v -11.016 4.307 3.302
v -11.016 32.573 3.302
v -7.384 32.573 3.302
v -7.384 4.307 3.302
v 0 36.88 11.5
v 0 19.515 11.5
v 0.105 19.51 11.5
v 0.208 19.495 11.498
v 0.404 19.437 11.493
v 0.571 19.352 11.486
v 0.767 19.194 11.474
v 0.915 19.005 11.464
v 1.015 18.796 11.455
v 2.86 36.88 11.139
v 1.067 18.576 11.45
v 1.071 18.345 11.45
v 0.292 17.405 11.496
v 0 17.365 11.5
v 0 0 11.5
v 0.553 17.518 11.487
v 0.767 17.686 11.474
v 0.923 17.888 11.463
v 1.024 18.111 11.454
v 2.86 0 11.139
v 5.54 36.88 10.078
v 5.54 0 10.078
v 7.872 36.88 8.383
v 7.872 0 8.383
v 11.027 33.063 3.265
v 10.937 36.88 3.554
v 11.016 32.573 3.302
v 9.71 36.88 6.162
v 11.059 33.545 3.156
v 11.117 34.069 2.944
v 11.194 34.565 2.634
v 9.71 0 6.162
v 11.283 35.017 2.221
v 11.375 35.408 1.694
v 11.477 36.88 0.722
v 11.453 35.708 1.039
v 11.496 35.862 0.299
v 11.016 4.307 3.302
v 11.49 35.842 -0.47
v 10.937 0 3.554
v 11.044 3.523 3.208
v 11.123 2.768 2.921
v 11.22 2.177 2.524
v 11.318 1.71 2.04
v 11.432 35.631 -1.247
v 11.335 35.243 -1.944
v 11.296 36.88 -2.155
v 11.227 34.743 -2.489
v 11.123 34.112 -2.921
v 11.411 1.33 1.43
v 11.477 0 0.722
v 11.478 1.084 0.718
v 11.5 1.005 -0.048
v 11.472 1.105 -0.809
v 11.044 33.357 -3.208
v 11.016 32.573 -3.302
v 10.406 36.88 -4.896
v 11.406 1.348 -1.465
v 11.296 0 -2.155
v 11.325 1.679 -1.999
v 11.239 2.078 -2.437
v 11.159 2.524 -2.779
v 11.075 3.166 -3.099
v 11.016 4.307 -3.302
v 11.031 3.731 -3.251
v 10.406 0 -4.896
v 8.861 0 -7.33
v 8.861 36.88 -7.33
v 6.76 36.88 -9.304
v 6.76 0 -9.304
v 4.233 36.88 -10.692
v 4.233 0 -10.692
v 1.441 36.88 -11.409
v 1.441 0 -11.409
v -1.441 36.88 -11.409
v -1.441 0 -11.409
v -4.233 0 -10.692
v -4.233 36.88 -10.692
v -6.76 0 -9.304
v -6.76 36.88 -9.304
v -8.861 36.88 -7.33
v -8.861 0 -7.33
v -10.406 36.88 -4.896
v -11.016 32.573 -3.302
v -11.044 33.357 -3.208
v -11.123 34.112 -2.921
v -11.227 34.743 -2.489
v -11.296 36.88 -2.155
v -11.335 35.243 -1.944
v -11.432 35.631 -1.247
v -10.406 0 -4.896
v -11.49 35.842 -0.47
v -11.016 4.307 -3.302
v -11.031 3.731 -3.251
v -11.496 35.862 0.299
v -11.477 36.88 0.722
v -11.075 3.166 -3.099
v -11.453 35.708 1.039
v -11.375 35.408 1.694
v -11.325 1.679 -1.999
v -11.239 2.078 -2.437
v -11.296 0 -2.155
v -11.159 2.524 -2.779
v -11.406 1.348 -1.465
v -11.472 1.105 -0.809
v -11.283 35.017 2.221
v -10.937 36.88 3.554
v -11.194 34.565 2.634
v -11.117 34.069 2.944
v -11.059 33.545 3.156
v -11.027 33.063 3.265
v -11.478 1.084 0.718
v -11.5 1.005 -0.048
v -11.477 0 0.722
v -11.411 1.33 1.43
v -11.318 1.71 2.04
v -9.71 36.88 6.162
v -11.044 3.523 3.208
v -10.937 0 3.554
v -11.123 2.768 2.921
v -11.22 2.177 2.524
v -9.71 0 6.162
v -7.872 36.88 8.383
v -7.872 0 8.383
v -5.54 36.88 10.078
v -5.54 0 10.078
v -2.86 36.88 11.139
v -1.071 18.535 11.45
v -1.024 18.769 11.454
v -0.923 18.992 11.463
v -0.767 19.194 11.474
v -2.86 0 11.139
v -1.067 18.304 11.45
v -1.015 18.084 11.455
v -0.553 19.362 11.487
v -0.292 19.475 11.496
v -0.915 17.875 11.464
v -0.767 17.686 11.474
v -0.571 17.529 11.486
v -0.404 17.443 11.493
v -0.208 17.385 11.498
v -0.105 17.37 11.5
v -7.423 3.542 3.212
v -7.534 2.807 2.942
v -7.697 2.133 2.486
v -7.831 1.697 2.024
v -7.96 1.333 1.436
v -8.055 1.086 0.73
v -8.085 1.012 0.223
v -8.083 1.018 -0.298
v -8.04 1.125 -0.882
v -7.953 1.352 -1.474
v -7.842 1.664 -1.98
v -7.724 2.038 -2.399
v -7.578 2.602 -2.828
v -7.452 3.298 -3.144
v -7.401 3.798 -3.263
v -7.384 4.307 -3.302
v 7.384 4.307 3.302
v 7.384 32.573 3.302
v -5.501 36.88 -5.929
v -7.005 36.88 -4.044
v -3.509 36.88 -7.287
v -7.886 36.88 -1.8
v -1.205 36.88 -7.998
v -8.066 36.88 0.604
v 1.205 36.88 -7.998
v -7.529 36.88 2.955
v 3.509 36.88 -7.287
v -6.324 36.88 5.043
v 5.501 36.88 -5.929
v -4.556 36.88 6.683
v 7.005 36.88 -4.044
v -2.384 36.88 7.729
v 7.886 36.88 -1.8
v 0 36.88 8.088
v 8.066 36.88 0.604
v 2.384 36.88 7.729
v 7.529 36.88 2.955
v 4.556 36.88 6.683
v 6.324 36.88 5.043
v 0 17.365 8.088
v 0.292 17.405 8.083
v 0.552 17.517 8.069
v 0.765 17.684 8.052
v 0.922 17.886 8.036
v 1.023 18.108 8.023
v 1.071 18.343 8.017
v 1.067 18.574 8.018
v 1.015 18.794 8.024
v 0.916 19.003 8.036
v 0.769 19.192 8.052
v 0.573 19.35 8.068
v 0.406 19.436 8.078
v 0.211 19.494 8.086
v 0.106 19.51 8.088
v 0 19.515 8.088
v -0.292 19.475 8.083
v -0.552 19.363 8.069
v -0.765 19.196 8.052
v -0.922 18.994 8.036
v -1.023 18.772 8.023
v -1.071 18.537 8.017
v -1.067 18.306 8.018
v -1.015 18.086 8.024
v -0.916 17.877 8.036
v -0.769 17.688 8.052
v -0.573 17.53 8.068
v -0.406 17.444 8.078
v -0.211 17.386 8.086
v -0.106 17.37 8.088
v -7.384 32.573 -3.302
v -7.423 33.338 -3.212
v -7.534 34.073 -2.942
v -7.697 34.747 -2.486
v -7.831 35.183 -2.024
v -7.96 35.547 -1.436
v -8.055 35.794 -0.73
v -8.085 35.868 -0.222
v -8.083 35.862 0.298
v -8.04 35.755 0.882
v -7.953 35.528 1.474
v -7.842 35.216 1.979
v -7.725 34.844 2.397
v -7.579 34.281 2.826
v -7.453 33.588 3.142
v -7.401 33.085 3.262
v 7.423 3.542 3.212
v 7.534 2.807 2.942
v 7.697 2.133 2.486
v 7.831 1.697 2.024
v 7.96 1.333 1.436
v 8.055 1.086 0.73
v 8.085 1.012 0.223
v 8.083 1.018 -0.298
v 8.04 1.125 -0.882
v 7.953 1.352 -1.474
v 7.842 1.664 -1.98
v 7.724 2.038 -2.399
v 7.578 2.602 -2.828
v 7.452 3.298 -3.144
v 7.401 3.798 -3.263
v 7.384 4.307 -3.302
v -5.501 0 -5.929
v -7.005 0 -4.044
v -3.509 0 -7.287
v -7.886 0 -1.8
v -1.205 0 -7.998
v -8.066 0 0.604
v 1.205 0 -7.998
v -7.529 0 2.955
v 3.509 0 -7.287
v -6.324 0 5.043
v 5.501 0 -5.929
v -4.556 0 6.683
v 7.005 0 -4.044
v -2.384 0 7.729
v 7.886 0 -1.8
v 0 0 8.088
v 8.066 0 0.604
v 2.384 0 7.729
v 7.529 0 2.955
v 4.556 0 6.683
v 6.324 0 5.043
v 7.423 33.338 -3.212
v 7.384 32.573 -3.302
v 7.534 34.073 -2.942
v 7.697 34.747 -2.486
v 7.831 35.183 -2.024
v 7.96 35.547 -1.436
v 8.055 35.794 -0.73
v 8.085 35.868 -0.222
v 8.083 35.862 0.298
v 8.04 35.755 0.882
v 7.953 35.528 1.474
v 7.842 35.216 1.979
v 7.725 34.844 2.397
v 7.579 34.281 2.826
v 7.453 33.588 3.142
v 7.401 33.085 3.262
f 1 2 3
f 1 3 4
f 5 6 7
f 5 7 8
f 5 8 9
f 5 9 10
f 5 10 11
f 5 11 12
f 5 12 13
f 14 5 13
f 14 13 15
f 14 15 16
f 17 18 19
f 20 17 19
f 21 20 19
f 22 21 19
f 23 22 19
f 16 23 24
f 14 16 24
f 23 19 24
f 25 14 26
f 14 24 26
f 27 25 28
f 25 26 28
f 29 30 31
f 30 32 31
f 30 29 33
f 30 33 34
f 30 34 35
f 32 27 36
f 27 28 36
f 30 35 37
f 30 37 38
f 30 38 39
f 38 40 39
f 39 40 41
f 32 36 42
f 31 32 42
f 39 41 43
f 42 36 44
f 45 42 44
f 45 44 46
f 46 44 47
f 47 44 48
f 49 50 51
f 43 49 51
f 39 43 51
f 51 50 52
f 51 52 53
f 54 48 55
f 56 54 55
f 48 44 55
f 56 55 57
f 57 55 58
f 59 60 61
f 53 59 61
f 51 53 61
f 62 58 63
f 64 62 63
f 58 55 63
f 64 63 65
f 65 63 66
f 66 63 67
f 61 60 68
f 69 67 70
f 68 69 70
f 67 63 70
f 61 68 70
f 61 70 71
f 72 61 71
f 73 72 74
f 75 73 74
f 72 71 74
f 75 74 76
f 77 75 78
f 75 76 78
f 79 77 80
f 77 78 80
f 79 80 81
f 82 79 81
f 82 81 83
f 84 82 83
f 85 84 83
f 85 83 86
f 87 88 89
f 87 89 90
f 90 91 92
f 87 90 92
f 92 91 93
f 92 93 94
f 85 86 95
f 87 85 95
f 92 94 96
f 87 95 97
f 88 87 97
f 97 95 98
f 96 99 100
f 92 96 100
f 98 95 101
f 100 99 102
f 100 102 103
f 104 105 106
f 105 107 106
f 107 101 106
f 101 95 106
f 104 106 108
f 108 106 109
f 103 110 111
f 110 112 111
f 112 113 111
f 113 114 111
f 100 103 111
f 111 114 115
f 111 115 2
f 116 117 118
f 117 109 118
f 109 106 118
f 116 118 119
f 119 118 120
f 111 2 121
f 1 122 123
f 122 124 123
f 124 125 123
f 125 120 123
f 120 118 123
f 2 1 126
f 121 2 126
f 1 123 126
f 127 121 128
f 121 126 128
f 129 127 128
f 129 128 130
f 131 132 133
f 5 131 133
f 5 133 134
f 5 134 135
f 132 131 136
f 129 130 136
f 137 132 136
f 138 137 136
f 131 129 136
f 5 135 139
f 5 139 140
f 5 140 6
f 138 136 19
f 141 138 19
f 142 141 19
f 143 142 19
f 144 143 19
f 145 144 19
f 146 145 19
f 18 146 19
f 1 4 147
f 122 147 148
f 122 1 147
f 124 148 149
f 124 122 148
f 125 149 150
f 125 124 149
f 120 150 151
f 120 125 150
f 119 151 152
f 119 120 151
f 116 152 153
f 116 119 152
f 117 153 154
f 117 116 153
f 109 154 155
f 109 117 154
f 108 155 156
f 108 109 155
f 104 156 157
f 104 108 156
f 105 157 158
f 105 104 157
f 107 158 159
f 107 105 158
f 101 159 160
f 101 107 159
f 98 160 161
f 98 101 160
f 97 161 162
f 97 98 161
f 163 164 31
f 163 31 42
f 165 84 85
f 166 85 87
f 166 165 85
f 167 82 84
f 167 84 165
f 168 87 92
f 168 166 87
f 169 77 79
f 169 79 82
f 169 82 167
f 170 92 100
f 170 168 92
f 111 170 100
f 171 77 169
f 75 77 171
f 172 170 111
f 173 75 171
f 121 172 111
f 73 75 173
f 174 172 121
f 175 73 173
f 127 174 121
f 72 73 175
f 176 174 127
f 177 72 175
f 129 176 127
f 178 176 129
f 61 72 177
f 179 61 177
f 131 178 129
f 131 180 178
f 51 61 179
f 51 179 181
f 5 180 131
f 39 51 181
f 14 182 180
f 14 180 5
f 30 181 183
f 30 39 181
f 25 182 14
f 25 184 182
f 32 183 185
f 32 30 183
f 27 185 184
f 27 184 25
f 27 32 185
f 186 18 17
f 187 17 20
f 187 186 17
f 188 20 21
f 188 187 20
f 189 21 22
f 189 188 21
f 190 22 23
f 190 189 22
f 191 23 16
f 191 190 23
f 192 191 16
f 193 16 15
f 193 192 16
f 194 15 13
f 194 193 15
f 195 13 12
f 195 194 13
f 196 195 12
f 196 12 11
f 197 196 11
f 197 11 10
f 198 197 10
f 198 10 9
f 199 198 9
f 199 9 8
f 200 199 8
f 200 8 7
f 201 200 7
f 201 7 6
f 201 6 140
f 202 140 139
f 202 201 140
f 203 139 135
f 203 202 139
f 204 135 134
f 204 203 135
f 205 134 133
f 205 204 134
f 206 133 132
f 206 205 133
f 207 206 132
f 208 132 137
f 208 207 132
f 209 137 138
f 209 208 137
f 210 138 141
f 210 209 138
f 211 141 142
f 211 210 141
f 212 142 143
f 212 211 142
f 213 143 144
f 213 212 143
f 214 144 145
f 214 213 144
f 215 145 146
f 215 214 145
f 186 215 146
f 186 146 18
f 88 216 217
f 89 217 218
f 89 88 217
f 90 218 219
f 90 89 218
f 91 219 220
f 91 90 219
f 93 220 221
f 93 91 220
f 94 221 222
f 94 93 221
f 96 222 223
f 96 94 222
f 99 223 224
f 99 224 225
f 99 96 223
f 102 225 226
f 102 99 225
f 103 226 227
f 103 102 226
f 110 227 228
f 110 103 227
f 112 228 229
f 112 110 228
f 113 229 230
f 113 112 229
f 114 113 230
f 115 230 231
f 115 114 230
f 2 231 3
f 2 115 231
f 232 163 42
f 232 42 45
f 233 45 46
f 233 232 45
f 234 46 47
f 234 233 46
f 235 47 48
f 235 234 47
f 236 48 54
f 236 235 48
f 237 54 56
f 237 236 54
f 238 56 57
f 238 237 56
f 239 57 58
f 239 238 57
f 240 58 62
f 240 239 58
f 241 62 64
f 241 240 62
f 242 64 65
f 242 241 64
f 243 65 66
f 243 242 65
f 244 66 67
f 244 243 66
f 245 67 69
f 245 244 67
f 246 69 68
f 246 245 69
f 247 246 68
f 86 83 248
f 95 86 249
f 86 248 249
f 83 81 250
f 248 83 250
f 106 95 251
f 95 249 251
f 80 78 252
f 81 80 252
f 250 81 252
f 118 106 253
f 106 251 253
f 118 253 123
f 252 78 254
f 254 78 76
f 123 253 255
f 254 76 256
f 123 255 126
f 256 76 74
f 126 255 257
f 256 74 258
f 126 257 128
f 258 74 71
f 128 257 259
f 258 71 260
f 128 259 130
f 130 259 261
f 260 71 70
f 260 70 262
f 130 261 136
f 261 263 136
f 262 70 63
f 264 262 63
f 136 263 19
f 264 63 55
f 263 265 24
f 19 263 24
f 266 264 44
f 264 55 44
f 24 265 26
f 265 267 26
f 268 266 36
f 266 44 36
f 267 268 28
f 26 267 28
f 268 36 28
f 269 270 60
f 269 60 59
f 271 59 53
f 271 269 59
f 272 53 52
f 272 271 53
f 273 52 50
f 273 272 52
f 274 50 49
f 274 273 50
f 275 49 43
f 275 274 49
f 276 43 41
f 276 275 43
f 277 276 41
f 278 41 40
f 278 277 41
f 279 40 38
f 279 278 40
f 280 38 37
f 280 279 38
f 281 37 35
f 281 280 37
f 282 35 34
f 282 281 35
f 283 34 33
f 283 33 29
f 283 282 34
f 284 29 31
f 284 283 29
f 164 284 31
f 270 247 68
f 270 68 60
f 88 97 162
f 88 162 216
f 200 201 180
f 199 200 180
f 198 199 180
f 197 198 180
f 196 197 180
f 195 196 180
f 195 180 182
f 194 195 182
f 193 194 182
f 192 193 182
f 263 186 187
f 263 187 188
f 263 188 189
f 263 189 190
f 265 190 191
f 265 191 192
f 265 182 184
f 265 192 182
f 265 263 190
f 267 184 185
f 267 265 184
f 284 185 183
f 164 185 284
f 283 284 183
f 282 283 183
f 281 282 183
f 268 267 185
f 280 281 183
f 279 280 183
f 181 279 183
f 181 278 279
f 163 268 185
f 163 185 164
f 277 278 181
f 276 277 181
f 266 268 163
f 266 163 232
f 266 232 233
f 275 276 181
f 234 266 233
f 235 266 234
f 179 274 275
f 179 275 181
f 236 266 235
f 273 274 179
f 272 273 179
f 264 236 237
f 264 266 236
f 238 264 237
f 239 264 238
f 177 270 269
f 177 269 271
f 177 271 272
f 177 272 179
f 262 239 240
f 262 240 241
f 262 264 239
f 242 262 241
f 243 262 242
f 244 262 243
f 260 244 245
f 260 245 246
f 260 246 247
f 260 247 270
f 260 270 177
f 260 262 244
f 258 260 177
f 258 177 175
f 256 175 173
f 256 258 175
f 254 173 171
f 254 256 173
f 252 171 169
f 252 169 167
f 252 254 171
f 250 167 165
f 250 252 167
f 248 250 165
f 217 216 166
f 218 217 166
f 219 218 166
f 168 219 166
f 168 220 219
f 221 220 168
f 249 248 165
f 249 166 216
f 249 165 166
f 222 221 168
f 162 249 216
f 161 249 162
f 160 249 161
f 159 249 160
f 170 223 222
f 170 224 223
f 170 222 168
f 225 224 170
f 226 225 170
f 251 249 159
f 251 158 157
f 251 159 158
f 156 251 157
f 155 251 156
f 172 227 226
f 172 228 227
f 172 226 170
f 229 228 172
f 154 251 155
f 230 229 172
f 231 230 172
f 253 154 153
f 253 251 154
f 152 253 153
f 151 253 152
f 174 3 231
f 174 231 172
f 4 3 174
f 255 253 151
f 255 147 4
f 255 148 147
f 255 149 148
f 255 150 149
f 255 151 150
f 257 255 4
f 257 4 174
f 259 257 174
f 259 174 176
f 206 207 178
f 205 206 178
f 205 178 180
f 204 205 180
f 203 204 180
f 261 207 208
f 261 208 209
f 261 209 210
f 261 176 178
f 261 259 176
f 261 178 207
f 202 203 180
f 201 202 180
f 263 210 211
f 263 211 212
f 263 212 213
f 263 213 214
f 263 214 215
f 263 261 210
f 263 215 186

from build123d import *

# Parameters (mm, degrees)
SKETCH1_R           = 11.5
SKETCH1_R_2         = 8.0883
BOSS_EXTRUDE1_DEPTH = 36.88
CUT_EXTRUDE1_DEPTH  = 55.88
SKETCH3_R           = 1.075360457
CUT_EXTRUDE2_DEPTH  = 41.306753925


with BuildPart() as part:
    # Sketch1 → Boss-Extrude1 (new body)
    with BuildSketch(Plane(origin=(0, 0, 0), x_dir=(1, 0, 0), z_dir=(0, 1, 0))):
        with Locations(Location((0, 0, 0), (0, 0, 270))):
            Circle(SKETCH1_R)
        with Locations(Location((0, 0, 0), (0, 0, 270))):
            Circle(SKETCH1_R_2, mode=Mode.SUBTRACT)
    extrude(amount=BOSS_EXTRUDE1_DEPTH)

    # Sketch2 → Cut-Extrude1 (cut)
    with BuildSketch(Plane.ZY.offset(11.5)):
        with BuildLine():
            Line((3.302, 32.573327327), (3.302, 4.306672673))
            ThreePointArc((3.302, 4.306672673), (0, 1.004672673), (-3.302, 4.306672673))
            Line((-3.302, 4.306672673), (-3.302, 32.573327327))
            ThreePointArc((-3.302, 32.573327327), (0, 35.875327327), (3.302, 32.573327327))
        make_face()
    extrude(amount=-CUT_EXTRUDE1_DEPTH, mode=Mode.SUBTRACT)

    # Sketch3 → Cut-Extrude2 (cut, through all)
    with BuildSketch(Plane.XY):
        with Locations(Location((0, 18.44, 0), (0, 0, 270.000000024))):
            Circle(SKETCH3_R)
    extrude(amount=CUT_EXTRUDE2_DEPTH, mode=Mode.SUBTRACT)


solid = part.part
